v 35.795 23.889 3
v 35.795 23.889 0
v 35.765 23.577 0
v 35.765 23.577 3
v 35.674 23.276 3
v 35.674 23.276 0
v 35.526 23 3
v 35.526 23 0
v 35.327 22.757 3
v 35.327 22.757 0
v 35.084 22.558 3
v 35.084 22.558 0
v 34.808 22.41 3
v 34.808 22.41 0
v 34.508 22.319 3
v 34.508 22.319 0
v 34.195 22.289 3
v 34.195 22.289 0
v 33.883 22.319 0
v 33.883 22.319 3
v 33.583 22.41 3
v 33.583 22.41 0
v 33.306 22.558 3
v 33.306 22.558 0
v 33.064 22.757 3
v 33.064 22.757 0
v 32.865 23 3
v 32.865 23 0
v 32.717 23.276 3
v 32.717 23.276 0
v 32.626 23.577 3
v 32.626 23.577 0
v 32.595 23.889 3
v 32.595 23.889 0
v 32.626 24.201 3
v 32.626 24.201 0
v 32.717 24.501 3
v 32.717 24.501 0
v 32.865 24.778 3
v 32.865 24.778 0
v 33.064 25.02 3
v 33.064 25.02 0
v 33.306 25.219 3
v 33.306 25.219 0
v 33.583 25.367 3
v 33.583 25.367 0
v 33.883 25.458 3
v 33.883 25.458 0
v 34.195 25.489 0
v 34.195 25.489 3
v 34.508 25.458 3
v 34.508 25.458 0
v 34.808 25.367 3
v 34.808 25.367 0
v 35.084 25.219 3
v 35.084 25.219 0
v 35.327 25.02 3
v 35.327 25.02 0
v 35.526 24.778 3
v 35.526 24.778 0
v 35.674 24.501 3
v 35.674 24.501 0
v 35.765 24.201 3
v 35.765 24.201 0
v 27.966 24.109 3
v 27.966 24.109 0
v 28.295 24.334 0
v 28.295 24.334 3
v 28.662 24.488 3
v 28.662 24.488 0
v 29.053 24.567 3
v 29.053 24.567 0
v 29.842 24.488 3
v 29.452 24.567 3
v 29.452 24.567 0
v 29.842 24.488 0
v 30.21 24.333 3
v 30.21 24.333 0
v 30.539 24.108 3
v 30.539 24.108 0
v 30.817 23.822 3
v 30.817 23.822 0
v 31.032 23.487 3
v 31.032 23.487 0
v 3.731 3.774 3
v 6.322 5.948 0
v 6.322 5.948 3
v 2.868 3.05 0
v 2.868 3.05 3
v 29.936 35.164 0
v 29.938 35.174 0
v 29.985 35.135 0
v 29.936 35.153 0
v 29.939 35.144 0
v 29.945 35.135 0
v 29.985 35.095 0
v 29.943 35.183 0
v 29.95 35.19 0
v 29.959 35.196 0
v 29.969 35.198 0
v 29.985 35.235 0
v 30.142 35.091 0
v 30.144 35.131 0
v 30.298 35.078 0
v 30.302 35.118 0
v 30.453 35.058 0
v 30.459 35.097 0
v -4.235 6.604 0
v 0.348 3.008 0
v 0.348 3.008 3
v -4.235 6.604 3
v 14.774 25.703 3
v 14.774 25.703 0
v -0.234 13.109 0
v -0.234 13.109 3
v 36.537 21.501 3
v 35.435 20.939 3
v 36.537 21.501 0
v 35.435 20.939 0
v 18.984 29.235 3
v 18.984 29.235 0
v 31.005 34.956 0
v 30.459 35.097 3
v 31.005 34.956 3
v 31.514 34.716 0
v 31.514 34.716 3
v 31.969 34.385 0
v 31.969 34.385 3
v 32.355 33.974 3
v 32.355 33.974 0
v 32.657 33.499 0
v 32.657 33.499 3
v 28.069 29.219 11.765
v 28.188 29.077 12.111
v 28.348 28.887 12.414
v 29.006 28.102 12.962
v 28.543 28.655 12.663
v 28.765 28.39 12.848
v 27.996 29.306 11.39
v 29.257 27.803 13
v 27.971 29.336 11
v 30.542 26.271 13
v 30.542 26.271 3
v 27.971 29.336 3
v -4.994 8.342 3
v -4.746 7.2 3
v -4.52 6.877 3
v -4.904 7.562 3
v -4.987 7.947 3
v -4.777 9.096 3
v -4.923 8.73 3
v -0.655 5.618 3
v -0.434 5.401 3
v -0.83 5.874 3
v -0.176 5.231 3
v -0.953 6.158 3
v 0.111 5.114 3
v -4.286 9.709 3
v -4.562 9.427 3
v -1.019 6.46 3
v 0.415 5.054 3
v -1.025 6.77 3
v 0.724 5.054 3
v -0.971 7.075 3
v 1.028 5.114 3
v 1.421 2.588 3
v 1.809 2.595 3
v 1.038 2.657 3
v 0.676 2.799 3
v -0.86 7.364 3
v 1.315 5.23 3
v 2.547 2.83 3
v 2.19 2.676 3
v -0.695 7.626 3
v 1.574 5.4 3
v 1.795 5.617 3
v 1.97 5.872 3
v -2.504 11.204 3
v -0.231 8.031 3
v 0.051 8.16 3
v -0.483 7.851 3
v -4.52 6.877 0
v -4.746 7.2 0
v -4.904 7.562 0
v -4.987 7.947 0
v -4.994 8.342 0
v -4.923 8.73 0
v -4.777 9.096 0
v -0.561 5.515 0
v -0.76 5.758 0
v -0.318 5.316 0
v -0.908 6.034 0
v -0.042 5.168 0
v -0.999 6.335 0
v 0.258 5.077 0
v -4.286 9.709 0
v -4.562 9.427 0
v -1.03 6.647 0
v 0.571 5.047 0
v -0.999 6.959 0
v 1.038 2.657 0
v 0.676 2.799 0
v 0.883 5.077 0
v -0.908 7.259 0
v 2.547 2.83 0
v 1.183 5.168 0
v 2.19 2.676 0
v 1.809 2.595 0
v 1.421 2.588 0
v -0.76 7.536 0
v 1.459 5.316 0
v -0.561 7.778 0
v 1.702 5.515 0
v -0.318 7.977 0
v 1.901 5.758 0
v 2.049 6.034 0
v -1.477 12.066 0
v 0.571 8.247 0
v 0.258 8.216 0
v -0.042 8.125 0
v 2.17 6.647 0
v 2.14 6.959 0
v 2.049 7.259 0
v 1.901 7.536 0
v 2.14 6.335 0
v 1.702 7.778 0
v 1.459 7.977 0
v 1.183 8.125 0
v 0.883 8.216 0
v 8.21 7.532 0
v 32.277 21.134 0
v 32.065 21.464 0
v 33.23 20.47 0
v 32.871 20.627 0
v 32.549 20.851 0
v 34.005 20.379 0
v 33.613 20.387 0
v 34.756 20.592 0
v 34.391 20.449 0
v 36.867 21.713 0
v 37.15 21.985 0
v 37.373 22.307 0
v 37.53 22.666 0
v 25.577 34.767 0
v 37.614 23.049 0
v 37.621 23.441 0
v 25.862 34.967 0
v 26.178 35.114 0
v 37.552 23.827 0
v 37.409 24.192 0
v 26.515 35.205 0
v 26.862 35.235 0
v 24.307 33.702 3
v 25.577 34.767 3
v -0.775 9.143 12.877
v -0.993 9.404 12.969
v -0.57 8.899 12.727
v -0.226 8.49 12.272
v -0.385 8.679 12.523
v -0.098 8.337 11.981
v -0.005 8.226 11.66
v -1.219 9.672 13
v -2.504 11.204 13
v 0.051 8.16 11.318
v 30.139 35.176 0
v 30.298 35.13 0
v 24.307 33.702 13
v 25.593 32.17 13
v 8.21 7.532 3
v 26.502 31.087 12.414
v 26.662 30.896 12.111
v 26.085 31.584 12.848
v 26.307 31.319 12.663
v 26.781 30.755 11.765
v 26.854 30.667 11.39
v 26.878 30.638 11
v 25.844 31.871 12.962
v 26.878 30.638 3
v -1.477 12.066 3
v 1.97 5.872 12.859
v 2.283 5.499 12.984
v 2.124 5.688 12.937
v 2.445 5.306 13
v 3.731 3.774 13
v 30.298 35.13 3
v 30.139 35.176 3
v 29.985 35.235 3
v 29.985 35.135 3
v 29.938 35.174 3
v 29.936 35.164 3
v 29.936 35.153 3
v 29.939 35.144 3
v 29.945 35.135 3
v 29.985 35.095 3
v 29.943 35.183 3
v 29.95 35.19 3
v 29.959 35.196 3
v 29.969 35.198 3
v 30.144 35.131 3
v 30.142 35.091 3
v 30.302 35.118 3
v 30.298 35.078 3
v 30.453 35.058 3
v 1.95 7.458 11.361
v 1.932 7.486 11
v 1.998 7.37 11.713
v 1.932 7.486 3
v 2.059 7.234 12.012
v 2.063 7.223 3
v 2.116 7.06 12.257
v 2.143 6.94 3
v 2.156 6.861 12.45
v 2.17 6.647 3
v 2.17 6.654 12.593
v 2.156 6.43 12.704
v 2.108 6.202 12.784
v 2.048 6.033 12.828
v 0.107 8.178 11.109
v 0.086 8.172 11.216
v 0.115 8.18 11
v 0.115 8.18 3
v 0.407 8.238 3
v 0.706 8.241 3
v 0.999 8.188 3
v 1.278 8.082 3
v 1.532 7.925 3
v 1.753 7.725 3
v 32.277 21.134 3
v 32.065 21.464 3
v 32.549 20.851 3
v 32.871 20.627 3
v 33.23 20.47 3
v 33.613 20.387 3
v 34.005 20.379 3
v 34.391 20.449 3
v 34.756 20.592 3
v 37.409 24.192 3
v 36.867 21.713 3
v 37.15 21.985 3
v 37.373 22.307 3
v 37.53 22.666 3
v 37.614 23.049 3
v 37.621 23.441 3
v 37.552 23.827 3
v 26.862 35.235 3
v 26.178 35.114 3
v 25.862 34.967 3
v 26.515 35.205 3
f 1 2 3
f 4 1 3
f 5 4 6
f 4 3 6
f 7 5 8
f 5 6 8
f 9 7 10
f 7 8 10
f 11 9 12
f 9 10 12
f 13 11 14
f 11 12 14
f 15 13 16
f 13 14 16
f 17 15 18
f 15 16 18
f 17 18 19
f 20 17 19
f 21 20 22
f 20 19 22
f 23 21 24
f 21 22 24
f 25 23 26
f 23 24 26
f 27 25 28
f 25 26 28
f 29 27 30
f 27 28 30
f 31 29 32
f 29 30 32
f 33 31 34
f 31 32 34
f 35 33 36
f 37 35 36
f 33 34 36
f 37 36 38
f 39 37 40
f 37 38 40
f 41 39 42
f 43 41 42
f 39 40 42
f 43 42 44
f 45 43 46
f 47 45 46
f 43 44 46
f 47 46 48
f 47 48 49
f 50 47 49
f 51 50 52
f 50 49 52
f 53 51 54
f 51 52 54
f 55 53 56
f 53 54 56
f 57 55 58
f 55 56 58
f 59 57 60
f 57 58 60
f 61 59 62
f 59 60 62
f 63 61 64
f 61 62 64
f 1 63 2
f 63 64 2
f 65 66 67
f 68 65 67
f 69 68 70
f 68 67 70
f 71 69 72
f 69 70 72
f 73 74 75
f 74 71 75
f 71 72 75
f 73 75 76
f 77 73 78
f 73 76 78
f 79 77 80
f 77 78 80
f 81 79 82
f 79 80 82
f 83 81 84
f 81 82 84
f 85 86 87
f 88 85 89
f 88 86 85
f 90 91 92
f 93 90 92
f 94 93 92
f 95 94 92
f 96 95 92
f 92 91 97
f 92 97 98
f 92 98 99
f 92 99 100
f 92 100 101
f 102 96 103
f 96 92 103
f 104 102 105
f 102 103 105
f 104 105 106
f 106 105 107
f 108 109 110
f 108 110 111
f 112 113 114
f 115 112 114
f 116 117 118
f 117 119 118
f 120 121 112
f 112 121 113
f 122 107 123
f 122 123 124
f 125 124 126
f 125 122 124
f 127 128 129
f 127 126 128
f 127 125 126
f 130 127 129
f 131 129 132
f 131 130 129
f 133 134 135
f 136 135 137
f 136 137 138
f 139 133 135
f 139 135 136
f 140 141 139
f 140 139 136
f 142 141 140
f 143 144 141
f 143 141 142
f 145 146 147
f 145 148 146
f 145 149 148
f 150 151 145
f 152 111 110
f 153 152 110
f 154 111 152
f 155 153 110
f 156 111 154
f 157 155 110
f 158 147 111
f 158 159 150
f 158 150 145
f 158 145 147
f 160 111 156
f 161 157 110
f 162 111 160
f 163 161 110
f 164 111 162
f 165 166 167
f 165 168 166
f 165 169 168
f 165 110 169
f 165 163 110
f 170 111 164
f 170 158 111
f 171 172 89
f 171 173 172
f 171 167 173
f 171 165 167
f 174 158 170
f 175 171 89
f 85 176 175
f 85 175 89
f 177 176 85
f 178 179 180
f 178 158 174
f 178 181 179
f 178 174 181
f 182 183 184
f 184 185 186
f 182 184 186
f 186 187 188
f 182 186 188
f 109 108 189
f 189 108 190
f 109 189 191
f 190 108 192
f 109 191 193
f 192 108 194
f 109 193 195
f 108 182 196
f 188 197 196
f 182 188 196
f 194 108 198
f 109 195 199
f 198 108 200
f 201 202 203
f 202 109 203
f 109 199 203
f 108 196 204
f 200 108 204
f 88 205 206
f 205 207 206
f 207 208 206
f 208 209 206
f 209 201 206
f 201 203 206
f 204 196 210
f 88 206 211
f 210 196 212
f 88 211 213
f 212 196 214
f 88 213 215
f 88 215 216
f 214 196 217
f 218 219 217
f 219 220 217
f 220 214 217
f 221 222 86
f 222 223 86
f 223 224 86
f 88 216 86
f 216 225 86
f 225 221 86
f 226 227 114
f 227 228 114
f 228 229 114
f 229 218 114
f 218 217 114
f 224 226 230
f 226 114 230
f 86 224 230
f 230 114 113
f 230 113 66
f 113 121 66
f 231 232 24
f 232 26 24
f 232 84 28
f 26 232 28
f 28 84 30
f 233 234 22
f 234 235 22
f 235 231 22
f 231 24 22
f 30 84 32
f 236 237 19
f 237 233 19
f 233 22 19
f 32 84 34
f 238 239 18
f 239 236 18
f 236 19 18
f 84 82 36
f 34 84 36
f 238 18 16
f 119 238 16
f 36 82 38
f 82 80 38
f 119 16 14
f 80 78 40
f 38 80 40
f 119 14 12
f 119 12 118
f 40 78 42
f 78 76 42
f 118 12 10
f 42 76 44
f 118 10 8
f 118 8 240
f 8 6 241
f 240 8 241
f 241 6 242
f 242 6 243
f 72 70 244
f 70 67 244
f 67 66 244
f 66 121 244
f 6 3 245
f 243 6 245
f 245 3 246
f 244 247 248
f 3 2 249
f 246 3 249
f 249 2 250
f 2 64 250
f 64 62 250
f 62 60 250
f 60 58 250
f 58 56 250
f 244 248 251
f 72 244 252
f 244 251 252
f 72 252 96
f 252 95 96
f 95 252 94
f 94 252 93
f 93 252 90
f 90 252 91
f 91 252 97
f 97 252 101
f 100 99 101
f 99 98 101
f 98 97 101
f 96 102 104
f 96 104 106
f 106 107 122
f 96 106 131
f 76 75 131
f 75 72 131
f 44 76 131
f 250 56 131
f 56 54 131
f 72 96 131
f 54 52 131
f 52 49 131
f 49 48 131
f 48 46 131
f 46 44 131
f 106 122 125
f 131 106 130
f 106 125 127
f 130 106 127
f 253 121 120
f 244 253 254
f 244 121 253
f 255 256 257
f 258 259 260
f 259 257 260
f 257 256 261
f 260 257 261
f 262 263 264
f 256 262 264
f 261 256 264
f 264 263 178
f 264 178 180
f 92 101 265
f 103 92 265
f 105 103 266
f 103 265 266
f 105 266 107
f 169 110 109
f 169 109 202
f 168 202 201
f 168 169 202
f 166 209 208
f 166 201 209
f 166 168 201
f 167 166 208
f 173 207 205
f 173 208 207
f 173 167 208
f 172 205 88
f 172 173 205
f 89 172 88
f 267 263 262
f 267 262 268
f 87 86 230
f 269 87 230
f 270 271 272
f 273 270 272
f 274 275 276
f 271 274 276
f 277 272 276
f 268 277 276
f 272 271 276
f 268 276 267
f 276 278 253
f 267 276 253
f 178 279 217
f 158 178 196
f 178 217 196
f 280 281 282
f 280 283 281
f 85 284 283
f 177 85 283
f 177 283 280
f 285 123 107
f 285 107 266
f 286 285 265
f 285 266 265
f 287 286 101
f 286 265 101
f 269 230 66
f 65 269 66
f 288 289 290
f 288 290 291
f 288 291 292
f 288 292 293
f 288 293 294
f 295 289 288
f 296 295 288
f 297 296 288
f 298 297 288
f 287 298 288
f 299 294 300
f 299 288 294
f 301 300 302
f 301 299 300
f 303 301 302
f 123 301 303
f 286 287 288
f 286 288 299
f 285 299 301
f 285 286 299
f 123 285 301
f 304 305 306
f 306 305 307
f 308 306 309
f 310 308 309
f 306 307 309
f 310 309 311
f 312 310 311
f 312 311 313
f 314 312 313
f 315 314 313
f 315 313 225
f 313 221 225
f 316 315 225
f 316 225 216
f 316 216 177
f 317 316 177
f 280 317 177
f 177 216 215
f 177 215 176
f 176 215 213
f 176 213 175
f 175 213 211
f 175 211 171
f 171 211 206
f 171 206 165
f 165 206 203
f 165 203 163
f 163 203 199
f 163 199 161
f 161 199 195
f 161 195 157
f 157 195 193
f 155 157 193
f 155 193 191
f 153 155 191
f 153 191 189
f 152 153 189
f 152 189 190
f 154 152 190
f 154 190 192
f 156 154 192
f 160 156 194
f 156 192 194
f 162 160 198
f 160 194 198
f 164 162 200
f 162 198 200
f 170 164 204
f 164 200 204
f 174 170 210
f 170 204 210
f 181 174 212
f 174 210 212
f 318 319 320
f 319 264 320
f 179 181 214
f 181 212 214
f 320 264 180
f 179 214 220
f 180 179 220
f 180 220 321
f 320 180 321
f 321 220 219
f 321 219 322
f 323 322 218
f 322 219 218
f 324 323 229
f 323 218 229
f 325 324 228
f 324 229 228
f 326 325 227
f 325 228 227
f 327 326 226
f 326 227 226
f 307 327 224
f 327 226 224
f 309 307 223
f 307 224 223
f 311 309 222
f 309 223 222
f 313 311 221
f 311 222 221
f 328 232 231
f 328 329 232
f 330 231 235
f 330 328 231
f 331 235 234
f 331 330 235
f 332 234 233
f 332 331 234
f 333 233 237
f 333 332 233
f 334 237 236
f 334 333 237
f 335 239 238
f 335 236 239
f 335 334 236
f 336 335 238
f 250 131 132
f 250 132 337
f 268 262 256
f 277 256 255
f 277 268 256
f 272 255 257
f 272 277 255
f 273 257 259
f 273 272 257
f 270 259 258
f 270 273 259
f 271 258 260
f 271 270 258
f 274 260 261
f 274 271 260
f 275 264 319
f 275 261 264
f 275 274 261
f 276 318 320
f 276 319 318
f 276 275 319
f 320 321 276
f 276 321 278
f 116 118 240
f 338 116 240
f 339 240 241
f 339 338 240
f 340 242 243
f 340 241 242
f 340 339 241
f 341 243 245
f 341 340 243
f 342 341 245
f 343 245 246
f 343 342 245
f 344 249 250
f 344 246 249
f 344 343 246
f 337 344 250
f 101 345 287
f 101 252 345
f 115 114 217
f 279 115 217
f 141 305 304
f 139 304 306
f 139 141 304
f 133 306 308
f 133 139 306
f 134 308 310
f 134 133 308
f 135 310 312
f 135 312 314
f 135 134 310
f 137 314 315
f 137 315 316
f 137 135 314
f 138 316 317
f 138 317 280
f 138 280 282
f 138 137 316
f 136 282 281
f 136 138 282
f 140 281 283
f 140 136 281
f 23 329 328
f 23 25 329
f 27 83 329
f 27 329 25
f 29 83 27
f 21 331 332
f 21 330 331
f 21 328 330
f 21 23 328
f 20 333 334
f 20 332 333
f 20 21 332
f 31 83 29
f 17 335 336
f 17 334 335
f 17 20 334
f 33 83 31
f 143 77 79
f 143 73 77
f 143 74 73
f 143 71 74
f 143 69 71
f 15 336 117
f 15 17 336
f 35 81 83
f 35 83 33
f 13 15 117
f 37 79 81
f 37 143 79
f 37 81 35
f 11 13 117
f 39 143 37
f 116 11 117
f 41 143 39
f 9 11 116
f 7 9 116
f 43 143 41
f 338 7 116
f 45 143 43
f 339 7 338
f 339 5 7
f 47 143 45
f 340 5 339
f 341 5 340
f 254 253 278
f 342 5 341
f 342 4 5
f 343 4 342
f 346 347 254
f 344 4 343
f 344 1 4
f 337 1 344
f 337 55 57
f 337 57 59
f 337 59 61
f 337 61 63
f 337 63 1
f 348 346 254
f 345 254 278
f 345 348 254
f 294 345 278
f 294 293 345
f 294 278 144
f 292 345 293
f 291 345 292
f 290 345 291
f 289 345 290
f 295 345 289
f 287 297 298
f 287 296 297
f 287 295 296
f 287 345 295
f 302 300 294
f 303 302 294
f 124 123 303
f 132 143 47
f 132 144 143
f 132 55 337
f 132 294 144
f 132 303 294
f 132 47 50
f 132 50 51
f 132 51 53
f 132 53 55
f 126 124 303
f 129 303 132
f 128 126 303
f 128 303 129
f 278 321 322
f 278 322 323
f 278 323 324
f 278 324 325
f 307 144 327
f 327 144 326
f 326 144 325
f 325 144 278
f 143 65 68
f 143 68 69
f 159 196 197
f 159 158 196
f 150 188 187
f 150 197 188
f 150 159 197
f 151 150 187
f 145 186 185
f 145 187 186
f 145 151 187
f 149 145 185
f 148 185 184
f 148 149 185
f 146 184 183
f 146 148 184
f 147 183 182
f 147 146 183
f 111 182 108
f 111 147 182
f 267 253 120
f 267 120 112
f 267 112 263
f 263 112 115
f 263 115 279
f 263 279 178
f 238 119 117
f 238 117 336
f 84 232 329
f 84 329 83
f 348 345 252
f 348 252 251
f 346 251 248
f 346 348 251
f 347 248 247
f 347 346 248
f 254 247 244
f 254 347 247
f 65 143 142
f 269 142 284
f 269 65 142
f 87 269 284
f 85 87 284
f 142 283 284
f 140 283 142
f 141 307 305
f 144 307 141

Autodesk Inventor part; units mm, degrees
ref_plane "YZ Plane" through (0, 0, 0) normal (1, 0, 0) x (0, 1, 0)
ref_plane "XZ Plane" through (0, 0, 0) normal (0, 1, 0) x (-1, 0, 0)
ref_plane "XY Plane" through (0, 0, 0) normal (0, 0, 1) x (1, 0, 0)
sketch "Sketch1" plane through (0, 0, 0) normal (0, 0, 1) x (1, 0, 0)
  circle A0 centre (0.5705, 6.6467) radius 1.6 projected
  circle A1 centre (34.1954, 23.8887) radius 1.6 projected
  circle A2 centre (-47.845, -32.335) radius 1.55 projected
  circle A3 centre (-32.175, 32.335) radius 1.55 projected
  circle A4 centre (16.035, -5.485) radius 1.55 projected
  circle A5 centre (29.985, 32.135) radius 1.55 projected
  circle A6 centre (47.845, -2.845) radius 1.55 projected
  line L0 (41.7829, 2.4307) -> (31.0323, 23.4866) projected
  line L1 (17.7425, -2.333) -> (40.1671, -0.4719) projected
  line L2 (1.7387, 9.5432) -> (3.1056, 8.4709) projected
  line L3 (8.2098, 7.5322) -> (27.9655, 24.1092) projected
  line L4 (27.8513, 29.235) -> (3.1056, 8.4709) projected
  line L5 (1.7387, 9.5432) -> (25.2065, 29.235) projected
  line L6 (27.8513, 29.235) -> (25.2065, 29.235) projected
  line L7 (14.7743, 25.7029) -> (-0.2342, 13.1093) projected
  line L8 (-18.8076, 25.6614) -> (-2.7542, 13.0678) projected
  line L9 (13.4887, 29.235) -> (-17.5731, 29.235) projected
  line L10 (7.493, -2.5969) -> (-27.9115, 25.1774) projected
  line L11 (-39.8787, -25.7324) -> (7.0335, -6.0143) projected
  line L12 (-31.0897, 24.0748) -> (-42.5975, -23.4177) projected
  line L13 (16.4652, -8.5584) -> (-46.6826, -35.1006) projected
  line L14 (48.0931, -5.8347) -> (17.0747, -8.409) projected
  arc A7 (48.0931, -5.8347) -> (50.5169, -1.4808) centre (47.845, -2.845) ccw projected
  line L15 (32.6569, 33.4992) -> (50.5169, -1.4808) projected
  arc A8 (32.6569, 33.4992) -> (29.985, 35.135) centre (29.985, 32.135) ccw projected
  line L16 (29.985, 35.235) -> (29.985, 35.135) projected
  line L17 (-31.4069, 35.235) -> (29.985, 35.235) projected
  arc A9 (-31.4069, 35.235) -> (-35.0906, 33.0415) centre (-32.175, 32.335) ccw projected
  line L18 (-50.7606, -31.6285) -> (-35.0906, 33.0415) projected
  arc A10 (-50.7606, -31.6285) -> (-46.6826, -35.1006) centre (-47.845, -32.335) ccw projected
  line L19 (29.8899, 25.724) -> (34.6062, 29.6814)
  line L20 (18.9837, 29.235) -> (26.1342, 35.235)
  line L21 (-1.4774, 12.0662) -> (-6.1744, 8.1249)
  line L22 (6.3217, 5.9479) -> (1.6247, 2.0067)
  line L23 (34.1954, 23.8887) -> (35.4353, 20.9387)
  line L24 (35.4353, 20.9387) -> (32.9746, 19.6824)
  line L25 (35.4353, 20.9387) -> (38.3184, 22.4108)
  arc A11 (16.3427, -1.9134) -> (17.7425, -2.333) centre (17.5771, -0.3398) ccw projected
  line L26 (8.261, 4.4266) -> (16.3427, -1.9134) projected
  arc A12 (8.2098, 7.5322) -> (8.261, 4.4266) centre (9.4954, 6.0002) ccw projected
  arc A13 (31.0323, 23.4866) -> (27.9655, 24.1092) centre (29.251, 22.5771) ccw projected
  arc A14 (40.1671, -0.4719) -> (41.7829, 2.4307) centre (40.0017, 1.5213) ccw projected
  arc A15 (-2.7542, 13.0678) -> (-0.2342, 13.1093) centre (-1.5198, 14.6414) ccw projected
  arc A16 (-17.5731, 29.235) -> (-18.8076, 25.6614) centre (-17.5731, 27.235) ccw projected
  arc A17 (14.7743, 25.7029) -> (13.4887, 29.235) centre (13.4887, 27.235) ccw projected
  arc A18 (7.0335, -6.0143) -> (7.493, -2.5969) centre (6.2586, -4.1705) ccw projected
  arc A19 (-42.5975, -23.4177) -> (-39.8787, -25.7324) centre (-40.6537, -23.8886) ccw projected
  arc A20 (-27.9115, 25.1774) -> (-31.0897, 24.0748) centre (-29.1459, 23.6038) ccw projected
  arc A21 (17.0747, -8.409) -> (16.4652, -8.5584) centre (17.2401, -10.4022) ccw projected
  line L27 (18.9837, 29.235) -> (-1.4774, 12.0662)
  line L28 (6.2586, 5.8949) -> (29.8899, 25.724)
  point P0 (0, 0)
  dimension "d11" = 3.2
extrude "Extrusion1" add sketch "Sketch1" along normal blind 3 contours A5 | L0 A13 L28 L19 L15 L25 L24 | L3 L28 L22 L10 L21 L27 L7 L20 L17 L16 A8 L15 L19 | L5 L6 L4 L2
fillet "Fillet1" radius 2 3 edges at (26.1342, 35.235, 1.5) (1.6247, 2.0067, 1.5) (-6.1744, 8.1249, 1.5)
sketch "Sketch2" plane through (0, 0, 3) normal (0, 0, 1) x (1, 0, 0)
  line L0 (1.7387, 9.5432) -> (25.2065, 29.235) construction
  line L1 (13.4726, 19.3891) -> (14.5654, 18.0868) construction
  line L2 (27.8513, 29.235) -> (3.1056, 8.4709) construction
  line L3 (1.1596, 6.838) -> (27.9712, 29.3356) construction
  line L4 (27.9712, 29.3356) -> (26.8784, 30.6379) construction
  line L5 (26.8784, 30.6379) -> (0.0669, 8.1403) construction
  line L6 (0.0669, 8.1403) -> (1.1596, 6.838) construction
  line L7 (1.1596, 6.838) -> (26.8784, 30.6379) construction
  line L8 (27.9712, 29.3356) -> (0.0669, 8.1403) construction
  line L9 (1.1596, 6.838) -> (36.1596, 6.838) construction
  line L10 (1.1596, 6.838) -> (27.9712, 29.3356)
  line L11 (27.9712, 29.3356) -> (30.5423, 26.2714)
  line L12 (30.5423, 26.2714) -> (3.7308, 3.7738)
  line L13 (3.7308, 3.7738) -> (1.1596, 6.838)
  line L14 (0.0669, 8.1403) -> (26.8784, 30.6379)
  line L15 (26.8784, 30.6379) -> (24.3073, 33.702)
  line L16 (24.3073, 33.702) -> (-2.5043, 11.2045)
  line L17 (-2.5043, 11.2045) -> (0.0669, 8.1403)
  circle A0 centre (0.5705, 6.6467) radius 1.6 projected
  point P0 (0, 0)
  point P1 (14.019, 18.7379)
  point P2 (0.0505, 8.1598)
  point P3 (0.1146, 8.1803)
  point P4 (1.9324, 7.4865)
  point P5 (1.9704, 5.8718)
  dimension "d3" = 35
  dimension "d4" = 40
  dimension "d5" = 1.7
  dimension "d6" = 4
  dimension "d7" = 4
extrude "Extrusion2" add sketch "Sketch2" along normal blind 10 contours L10 L11 L12 L13 A0 | A0 L17 L16 L15 L14
fillet "Fillet2" radius 2 2 edges at (14.9518, 18.411, 13) (13.4965, 19.4091, 13)
fillet "Fillet3" radius 2 2 edges at (38.3184, 22.4108, 1.5) (32.9746, 19.6824, 1.5)
fillet "Fillet4" radius 2 1 edges at (29.985, 35.135, 1.5)
properties part number "skr-mini-mount-clip"
